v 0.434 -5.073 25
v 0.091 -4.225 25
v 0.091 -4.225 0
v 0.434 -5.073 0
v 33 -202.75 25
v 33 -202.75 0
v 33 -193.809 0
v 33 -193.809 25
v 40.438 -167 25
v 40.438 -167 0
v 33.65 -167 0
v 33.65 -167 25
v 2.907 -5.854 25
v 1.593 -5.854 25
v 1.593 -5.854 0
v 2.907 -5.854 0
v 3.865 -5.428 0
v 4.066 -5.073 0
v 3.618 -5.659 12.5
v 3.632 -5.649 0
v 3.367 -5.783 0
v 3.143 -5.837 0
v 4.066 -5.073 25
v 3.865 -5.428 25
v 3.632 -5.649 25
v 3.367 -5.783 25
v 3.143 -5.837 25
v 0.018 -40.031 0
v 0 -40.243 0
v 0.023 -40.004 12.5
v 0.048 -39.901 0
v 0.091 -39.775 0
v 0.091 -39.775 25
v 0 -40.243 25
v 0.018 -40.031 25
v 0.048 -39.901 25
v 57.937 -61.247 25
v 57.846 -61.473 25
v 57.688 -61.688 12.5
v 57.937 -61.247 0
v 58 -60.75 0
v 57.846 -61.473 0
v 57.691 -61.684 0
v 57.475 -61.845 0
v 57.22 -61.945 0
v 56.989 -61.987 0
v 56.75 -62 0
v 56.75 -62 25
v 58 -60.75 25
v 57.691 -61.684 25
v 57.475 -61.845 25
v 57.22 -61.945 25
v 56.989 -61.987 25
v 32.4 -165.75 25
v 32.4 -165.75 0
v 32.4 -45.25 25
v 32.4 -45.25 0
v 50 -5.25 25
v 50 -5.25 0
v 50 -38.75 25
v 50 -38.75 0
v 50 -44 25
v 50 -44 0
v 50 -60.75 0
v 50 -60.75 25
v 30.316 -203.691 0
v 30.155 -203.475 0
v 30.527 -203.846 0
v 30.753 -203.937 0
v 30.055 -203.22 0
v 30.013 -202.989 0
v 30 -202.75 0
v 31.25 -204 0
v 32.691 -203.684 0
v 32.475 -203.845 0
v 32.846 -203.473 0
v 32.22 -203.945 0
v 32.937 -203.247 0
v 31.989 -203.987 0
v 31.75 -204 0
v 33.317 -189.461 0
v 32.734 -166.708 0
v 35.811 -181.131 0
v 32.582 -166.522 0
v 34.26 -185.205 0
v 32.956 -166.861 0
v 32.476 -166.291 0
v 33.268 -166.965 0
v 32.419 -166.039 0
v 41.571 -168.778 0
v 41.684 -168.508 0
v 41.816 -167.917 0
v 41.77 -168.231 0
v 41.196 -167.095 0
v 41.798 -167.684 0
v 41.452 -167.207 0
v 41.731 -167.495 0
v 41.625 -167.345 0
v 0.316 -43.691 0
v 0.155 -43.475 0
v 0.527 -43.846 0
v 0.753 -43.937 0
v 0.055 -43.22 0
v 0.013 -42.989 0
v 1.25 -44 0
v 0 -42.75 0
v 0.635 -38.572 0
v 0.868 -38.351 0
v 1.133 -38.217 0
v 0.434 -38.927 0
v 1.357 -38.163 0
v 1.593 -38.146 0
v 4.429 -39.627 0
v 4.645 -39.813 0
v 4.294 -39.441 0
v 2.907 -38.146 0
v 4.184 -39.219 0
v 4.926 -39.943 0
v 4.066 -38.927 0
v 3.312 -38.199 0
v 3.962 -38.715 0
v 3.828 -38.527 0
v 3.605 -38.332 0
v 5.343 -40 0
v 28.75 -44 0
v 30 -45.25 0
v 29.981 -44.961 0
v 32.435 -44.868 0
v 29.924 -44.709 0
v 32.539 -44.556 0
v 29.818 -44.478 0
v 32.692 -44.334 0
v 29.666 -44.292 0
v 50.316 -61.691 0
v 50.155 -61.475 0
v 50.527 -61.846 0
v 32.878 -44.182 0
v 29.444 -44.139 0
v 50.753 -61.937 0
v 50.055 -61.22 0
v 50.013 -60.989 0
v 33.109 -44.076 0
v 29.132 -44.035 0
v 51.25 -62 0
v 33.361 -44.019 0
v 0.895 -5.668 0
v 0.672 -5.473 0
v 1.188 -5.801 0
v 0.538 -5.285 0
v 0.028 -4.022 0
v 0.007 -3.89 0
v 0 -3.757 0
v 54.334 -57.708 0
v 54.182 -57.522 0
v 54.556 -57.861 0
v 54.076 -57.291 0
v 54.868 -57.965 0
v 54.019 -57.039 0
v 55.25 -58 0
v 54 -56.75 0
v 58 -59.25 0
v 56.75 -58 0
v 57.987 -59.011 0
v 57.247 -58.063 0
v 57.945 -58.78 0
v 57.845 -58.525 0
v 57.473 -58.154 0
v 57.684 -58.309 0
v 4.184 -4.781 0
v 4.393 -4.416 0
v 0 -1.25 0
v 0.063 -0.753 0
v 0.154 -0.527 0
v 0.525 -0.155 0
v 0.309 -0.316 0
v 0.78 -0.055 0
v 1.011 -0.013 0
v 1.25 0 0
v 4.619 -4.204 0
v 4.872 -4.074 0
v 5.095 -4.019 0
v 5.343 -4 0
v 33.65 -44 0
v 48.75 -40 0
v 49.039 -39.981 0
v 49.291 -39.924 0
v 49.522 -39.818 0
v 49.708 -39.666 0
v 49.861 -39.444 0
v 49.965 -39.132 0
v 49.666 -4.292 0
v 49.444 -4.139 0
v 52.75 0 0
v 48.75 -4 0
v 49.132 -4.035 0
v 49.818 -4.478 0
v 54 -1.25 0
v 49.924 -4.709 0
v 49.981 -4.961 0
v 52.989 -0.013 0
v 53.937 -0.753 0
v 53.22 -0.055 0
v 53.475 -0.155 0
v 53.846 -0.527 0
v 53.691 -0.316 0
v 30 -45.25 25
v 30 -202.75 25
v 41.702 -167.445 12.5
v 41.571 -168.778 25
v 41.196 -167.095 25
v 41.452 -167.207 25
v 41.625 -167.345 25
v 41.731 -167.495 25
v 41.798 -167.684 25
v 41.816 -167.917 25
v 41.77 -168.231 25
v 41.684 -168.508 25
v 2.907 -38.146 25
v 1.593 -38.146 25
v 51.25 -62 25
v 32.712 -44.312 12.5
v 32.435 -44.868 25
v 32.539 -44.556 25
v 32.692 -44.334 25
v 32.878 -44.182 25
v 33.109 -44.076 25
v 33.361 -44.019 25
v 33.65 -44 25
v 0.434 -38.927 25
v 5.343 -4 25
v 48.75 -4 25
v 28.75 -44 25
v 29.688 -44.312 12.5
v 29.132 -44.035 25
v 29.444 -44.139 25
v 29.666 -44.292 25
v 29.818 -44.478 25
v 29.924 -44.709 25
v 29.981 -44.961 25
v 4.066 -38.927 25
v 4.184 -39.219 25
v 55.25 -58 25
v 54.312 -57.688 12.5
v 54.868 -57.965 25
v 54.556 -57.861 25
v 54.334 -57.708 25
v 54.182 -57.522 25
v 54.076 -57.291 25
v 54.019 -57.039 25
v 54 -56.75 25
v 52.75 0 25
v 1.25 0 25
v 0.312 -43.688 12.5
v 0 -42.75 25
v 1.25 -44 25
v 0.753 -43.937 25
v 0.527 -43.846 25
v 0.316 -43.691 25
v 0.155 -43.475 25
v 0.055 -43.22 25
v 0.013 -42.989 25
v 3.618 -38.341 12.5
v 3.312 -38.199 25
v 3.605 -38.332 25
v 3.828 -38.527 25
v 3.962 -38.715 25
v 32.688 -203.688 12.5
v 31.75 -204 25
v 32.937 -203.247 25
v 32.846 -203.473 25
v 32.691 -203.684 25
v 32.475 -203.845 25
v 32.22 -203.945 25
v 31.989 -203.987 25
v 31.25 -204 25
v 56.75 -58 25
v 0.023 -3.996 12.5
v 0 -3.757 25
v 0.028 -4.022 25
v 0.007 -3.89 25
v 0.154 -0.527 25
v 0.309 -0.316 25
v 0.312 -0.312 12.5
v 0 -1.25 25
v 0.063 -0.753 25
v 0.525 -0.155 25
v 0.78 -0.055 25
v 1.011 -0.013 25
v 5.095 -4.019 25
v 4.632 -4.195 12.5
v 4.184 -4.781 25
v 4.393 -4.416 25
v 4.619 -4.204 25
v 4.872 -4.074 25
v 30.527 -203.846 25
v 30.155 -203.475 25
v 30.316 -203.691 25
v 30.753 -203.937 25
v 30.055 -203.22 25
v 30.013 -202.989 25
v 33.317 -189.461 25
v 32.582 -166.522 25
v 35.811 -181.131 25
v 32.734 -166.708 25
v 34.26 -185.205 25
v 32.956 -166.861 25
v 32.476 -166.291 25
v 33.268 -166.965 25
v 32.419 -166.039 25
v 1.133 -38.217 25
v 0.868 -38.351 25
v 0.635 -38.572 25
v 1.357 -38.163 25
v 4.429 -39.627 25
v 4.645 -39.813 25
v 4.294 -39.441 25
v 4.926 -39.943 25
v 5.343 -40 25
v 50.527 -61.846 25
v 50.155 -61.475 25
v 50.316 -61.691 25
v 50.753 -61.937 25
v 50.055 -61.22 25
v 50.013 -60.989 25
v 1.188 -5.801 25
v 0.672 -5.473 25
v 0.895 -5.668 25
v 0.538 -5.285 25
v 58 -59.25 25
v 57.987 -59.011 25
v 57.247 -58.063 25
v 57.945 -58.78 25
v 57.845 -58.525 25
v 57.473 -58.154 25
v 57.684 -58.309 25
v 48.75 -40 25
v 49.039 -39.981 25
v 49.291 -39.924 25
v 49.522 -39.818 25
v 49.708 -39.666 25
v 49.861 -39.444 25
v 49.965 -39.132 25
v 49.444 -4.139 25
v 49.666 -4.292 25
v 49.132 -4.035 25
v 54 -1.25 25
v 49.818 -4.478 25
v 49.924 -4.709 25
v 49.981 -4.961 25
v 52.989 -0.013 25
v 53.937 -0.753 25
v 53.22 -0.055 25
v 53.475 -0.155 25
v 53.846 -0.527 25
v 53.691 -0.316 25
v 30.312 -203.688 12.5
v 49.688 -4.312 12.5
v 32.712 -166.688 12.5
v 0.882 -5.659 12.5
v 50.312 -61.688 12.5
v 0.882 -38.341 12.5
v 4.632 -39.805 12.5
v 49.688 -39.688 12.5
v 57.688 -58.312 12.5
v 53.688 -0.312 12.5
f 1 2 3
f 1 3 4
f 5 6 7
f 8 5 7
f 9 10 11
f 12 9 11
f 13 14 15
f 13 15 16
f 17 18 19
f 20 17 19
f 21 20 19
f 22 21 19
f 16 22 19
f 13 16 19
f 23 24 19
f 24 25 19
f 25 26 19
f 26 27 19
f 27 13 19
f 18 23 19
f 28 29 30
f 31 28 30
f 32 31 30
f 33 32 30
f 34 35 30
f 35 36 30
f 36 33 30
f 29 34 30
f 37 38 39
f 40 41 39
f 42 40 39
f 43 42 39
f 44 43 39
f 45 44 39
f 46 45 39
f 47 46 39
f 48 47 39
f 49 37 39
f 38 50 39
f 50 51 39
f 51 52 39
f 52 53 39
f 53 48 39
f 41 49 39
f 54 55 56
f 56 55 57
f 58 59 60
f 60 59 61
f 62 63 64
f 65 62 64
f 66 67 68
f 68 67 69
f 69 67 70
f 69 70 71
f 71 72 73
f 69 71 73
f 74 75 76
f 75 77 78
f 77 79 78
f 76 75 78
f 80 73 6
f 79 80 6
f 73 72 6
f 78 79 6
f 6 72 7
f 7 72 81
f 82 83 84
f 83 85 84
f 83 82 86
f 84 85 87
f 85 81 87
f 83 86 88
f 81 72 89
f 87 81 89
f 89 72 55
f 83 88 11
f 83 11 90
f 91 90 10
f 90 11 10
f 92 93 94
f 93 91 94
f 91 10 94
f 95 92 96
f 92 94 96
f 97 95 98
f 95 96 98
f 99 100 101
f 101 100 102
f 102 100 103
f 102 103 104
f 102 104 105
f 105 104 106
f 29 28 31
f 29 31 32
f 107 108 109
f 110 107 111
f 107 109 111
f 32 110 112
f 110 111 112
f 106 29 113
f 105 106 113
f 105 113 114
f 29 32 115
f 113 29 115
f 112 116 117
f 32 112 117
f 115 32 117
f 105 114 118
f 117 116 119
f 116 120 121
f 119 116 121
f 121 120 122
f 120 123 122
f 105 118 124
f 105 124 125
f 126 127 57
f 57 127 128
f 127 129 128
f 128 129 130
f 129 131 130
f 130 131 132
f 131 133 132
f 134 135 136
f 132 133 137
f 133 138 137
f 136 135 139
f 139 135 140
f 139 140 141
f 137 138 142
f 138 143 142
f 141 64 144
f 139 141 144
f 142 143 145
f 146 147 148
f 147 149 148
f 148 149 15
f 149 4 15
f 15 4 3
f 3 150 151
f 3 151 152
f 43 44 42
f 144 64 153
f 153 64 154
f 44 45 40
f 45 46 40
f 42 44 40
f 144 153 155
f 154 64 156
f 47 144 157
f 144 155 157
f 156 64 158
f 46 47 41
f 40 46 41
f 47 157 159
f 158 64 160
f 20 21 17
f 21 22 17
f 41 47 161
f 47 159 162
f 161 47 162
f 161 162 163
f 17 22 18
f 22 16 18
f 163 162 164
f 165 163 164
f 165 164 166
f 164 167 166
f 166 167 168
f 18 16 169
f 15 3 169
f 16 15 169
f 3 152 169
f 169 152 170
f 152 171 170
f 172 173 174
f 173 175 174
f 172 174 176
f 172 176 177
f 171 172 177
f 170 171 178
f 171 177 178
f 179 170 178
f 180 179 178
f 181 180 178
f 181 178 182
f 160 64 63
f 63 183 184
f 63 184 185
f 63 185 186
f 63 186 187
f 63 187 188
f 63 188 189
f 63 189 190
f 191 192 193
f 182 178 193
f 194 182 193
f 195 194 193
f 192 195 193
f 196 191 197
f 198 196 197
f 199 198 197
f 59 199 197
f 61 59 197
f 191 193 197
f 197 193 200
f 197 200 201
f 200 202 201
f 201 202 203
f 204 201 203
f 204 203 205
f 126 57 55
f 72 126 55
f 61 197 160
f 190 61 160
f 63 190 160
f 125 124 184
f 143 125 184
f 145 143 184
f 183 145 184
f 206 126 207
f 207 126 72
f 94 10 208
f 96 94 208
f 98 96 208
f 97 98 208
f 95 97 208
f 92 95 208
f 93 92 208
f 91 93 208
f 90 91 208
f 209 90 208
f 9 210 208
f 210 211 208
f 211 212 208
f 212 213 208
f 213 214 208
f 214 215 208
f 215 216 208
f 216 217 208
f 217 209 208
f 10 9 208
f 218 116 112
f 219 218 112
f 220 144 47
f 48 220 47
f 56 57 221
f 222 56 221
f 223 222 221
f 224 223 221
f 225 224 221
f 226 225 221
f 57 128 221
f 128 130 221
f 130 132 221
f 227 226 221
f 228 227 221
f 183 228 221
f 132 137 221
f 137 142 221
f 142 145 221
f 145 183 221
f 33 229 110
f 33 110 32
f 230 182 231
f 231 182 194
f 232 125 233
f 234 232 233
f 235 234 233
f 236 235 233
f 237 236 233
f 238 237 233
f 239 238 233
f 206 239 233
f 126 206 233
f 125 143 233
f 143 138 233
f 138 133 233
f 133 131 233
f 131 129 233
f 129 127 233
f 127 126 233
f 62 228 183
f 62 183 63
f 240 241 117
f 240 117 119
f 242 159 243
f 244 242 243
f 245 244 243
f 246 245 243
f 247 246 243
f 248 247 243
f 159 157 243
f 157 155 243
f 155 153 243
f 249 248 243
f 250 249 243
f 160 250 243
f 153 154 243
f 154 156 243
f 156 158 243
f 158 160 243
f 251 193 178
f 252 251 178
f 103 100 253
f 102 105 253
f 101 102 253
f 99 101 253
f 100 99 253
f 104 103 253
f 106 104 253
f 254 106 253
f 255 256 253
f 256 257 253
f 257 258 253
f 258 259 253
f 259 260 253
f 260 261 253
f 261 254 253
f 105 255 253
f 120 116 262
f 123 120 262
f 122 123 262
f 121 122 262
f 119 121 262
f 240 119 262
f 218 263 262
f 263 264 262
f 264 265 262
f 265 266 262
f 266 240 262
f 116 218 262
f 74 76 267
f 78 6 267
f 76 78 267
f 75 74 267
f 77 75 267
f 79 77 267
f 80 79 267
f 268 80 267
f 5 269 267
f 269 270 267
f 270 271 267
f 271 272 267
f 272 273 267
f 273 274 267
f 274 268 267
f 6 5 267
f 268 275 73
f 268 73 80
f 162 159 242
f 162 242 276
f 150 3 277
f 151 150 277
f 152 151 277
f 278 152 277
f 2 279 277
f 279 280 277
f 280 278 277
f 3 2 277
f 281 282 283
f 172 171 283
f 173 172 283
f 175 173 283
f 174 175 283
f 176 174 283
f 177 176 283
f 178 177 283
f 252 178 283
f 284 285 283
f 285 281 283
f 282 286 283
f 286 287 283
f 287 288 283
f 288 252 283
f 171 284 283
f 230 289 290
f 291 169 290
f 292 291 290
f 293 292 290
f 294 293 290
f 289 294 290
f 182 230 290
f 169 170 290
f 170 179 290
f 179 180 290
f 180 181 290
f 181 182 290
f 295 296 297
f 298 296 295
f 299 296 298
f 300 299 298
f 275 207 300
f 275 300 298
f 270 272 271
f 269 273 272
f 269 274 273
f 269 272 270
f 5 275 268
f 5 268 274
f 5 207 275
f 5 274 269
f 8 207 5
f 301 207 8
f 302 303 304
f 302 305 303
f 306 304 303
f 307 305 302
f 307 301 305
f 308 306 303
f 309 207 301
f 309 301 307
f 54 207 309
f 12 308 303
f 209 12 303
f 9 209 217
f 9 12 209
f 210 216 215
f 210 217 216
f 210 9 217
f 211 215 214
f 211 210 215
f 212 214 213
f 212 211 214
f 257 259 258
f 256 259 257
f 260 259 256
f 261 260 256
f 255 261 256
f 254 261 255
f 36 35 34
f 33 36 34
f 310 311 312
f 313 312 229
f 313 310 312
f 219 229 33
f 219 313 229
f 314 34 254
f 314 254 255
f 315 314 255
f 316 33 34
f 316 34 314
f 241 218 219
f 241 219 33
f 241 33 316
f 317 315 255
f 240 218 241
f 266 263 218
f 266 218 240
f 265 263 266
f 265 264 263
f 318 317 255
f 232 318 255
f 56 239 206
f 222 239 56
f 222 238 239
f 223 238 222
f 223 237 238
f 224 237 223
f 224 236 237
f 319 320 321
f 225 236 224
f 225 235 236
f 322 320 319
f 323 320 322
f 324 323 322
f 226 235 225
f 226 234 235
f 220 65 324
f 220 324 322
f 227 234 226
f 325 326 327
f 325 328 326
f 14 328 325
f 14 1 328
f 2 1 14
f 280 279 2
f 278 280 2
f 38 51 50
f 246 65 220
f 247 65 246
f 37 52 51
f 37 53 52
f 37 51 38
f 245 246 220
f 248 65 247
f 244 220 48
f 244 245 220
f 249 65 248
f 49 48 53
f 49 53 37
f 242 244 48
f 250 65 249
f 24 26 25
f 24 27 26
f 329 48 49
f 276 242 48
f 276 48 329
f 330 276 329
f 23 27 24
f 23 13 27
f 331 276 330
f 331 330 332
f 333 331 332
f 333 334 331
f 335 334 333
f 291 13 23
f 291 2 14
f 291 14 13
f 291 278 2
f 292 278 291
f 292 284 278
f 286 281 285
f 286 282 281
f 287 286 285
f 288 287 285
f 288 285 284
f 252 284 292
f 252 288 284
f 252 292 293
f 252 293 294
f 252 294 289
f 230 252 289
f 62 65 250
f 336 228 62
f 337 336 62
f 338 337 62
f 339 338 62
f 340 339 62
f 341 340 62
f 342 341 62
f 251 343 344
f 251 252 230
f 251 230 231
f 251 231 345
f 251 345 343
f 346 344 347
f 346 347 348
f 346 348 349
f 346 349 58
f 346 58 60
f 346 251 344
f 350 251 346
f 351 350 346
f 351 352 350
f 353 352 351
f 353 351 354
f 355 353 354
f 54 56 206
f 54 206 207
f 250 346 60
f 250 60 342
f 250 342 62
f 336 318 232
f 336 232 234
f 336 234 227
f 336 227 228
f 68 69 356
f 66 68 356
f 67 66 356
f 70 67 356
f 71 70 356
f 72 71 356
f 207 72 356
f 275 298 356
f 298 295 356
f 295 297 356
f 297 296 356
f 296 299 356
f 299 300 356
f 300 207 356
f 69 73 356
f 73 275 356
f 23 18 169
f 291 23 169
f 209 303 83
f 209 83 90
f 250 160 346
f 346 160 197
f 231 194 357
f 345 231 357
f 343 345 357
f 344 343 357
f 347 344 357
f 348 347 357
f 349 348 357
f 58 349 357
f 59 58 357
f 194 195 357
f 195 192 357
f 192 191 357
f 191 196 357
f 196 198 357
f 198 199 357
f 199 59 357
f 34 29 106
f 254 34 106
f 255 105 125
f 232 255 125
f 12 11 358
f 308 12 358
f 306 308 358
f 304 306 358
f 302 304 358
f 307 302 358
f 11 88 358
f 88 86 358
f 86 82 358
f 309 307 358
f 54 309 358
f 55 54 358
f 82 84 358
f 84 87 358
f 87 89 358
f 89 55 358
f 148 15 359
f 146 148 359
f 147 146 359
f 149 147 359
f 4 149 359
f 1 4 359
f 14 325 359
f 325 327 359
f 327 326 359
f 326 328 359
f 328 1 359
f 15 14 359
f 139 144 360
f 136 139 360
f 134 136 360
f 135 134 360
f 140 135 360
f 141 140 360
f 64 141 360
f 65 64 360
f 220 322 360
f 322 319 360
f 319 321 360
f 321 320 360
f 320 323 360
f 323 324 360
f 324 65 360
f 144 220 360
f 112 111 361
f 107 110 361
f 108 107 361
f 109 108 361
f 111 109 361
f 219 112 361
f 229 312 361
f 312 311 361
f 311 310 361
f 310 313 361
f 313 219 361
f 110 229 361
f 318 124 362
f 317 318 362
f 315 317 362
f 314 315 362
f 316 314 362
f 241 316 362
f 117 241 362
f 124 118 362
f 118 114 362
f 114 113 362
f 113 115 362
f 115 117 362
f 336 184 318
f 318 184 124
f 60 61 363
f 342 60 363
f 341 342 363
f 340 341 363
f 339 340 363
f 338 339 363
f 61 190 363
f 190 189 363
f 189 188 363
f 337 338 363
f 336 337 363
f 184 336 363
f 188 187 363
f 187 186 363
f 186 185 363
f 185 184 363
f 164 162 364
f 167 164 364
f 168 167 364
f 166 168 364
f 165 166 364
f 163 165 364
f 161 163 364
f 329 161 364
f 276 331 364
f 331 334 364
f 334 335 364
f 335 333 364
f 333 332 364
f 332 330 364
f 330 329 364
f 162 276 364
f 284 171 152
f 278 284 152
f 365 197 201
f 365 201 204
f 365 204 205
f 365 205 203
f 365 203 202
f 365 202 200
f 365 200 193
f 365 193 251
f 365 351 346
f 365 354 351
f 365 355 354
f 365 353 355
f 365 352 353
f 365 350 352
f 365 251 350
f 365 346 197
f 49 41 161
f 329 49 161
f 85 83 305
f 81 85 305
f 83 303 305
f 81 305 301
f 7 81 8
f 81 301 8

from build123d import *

# Parameters (mm, degrees)
F0_W        = 4
F0_H        = 4
F1_DEPTH    = 25
F2_T1_DEPTH = 25
F2_T3_DEPTH = 31.25
F2_T5_DEPTH = 29.2137491404
F2_T7_DEPTH = 26.2162531519
F2_T9_DEPTH = 34.810534857
F3_R        = 30


# Not quite as in the source:
# - a fillet or chamfer that OpenCascade refuses, or shapes differently, is made with other operations: its cross-section is extruded or revolved along the edge and cut away or added


with BuildPart() as f1:
    # F0 (on Top) → F1 (new body)
    with BuildSketch(Plane.XY):
        Polygon((54, 0), (0, 0), (0, -4), (4.5, -4), (50, -4), (50, -40), (4.5, -40), (0, -40), (0, -44), (30, -44), (30, -204), (33, -204), (33, -187.1583650528), (42.4, -167), (32.4, -167), (32.4, -44), (50, -44), (50, -62), (54, -62), (54, -58), align=None)
        Polygon((4.5, -4), (0, -4), (0.75, -5.8540496218), (3.75, -5.8540496218), align=None)
        with Locations((56, -60)):
            Rectangle(F0_W, F0_H)
        Polygon((0, -40), (4.5, -40), (3.75, -38.1459503782), (0.75, -38.1459503782), align=None)
    extrude(amount=F1_DEPTH)

    # F2: fillet of radius 1.25 on 23 edges, made by hand

    # F2_s2 → F2_t1 (join)
    with BuildSketch(Plane.XY):
        with BuildLine():
            add(Edge.make_bspline(
                [(4.1839688145, -4.78125), (4.5, -4), (5.3427498281, -4)],
                knots=[0, 0, 0, 1, 1, 1], degree=2, weights=[1, 1, 1]))
            Line((5.3427498281, -4), (4.5, -4))
            Line((4.5, -4), (4.1839688145, -4.78125))
        make_face()
        with BuildLine():
            add(Edge.make_bspline(
                [(5.3427498281, -40), (4.5, -40), (4.1839688145, -39.21875)],
                knots=[0, 0, 0, 1, 1, 1], degree=2, weights=[1, 1, 1]))
            Line((4.1839688145, -39.21875), (4.5, -40))
            Line((4.5, -40), (5.3427498281, -40))
        make_face()
        with BuildLine():
            add(Edge.make_bspline(
                [(50, -38.75), (50, -40), (48.75, -40)],
                knots=[0, 0, 0, 1, 1, 1], degree=2, weights=[1, 1, 1]))
            Line((48.75, -40), (50, -40))
            Line((50, -40), (50, -38.75))
        make_face()
        with BuildLine():
            add(Edge.make_bspline(
                [(48.75, -4), (50, -4), (50, -5.25)],
                knots=[0, 0, 0, 1, 1, 1], degree=2, weights=[1, 1, 1]))
            Line((50, -5.25), (50, -4))
            Line((50, -4), (48.75, -4))
        make_face()
        with BuildLine():
            add(Edge.make_bspline(
                [(55.25, -58), (54, -58), (54, -56.75)],
                knots=[0, 0, 0, 1, 1, 1], degree=2, weights=[1, 1, 1]))
            Line((54, -56.75), (54, -58))
            Line((54, -58), (55.25, -58))
        make_face()
        with BuildLine():
            add(Edge.make_bspline(
                [(28.75, -44), (30, -44), (30, -45.25)],
                knots=[0, 0, 0, 1, 1, 1], degree=2, weights=[1, 1, 1]))
            Line((30, -45.25), (30, -44))
            Line((30, -44), (28.75, -44))
        make_face()
        with BuildLine():
            add(Edge.make_bspline(
                [(32.4, -45.25), (32.4, -44), (33.65, -44)],
                knots=[0, 0, 0, 1, 1, 1], degree=2, weights=[1, 1, 1]))
            Line((33.65, -44), (32.4, -44))
            Line((32.4, -44), (32.4, -45.25))
        make_face()
        with BuildLine():
            add(Edge.make_bspline(
                [(33.65, -167), (32.4, -167), (32.4, -165.75)],
                knots=[0, 0, 0, 1, 1, 1], degree=2, weights=[1, 1, 1]))
            Line((32.4, -165.75), (32.4, -167))
            Line((32.4, -167), (33.65, -167))
        make_face()
    extrude(amount=F2_T1_DEPTH)

    # F2_s4 → F2_t3 (cut)
    with BuildSketch(Plane.XY.offset(-3.125)):
        with BuildLine():
            add(Edge.make_bspline(
                [(31.75, -204), (33, -204), (33, -202.75)],
                knots=[0, 0, 0, 1, 1, 1], degree=2, weights=[1, 1, 1]))
            Line((33, -202.75), (33, -204))
            Line((33, -204), (31.75, -204))
        make_face()
        with BuildLine():
            add(Edge.make_bspline(
                [(30, -202.75), (30, -204), (31.25, -204)],
                knots=[0, 0, 0, 1, 1, 1], degree=2, weights=[1, 1, 1]))
            Line((31.25, -204), (30, -204))
            Line((30, -204), (30, -202.75))
        make_face()
        with BuildLine():
            add(Edge.make_bspline(
                [(1.25, 0), (0, 0), (0, -1.25)],
                knots=[0, 0, 0, 1, 1, 1], degree=2, weights=[1, 1, 1]))
            Line((0, -1.25), (0, 0))
            Line((0, 0), (1.25, 0))
        make_face()
        with BuildLine():
            add(Edge.make_bspline(
                [(0, -42.75), (0, -44), (1.25, -44)],
                knots=[0, 0, 0, 1, 1, 1], degree=2, weights=[1, 1, 1]))
            Line((1.25, -44), (0, -44))
            Line((0, -44), (0, -42.75))
        make_face()
        with BuildLine():
            add(Edge.make_bspline(
                [(52.75, 0), (54, 0), (54, -1.25)],
                knots=[0, 0, 0, 1, 1, 1], degree=2, weights=[1, 1, 1]))
            Line((54, -1.25), (54, 0))
            Line((54, 0), (52.75, 0))
        make_face()
        with BuildLine():
            add(Edge.make_bspline(
                [(58, -59.25), (58, -58), (56.75, -58)],
                knots=[0, 0, 0, 1, 1, 1], degree=2, weights=[1, 1, 1]))
            Line((56.75, -58), (58, -58))
            Line((58, -58), (58, -59.25))
        make_face()
        with BuildLine():
            add(Edge.make_bspline(
                [(56.75, -62), (58, -62), (58, -60.75)],
                knots=[0, 0, 0, 1, 1, 1], degree=2, weights=[1, 1, 1]))
            Line((58, -60.75), (58, -62))
            Line((58, -62), (56.75, -62))
        make_face()
        with BuildLine():
            add(Edge.make_bspline(
                [(50, -60.75), (50, -62), (51.25, -62)],
                knots=[0, 0, 0, 1, 1, 1], degree=2, weights=[1, 1, 1]))
            Line((51.25, -62), (50, -62))
            Line((50, -62), (50, -60.75))
        make_face()
    extrude(amount=F2_T3_DEPTH, mode=Mode.SUBTRACT)

    # F2_s6 → F2_t5 (cut)
    with BuildSketch(Plane.XY.offset(-2.1068745702)):
        with BuildLine():
            add(Edge.make_bspline(
                [(2.9072501719, -5.8540496218), (3.75, -5.8540496218), (4.0660311855, -5.0727996218)],
                knots=[0, 0, 0, 1, 1, 1], degree=2, weights=[1, 1, 1]))
            Line((4.0660311855, -5.0727996218), (3.75, -5.8540496218))
            Line((3.75, -5.8540496218), (2.9072501719, -5.8540496218))
        make_face()
        with BuildLine():
            add(Edge.make_bspline(
                [(0.4339688145, -5.0727996218), (0.75, -5.8540496218), (1.5927498281, -5.8540496218)],
                knots=[0, 0, 0, 1, 1, 1], degree=2, weights=[1, 1, 1]))
            Line((1.5927498281, -5.8540496218), (0.75, -5.8540496218))
            Line((0.75, -5.8540496218), (0.4339688145, -5.0727996218))
        make_face()
        with BuildLine():
            add(Edge.make_bspline(
                [(1.5927498281, -38.1459503782), (0.75, -38.1459503782), (0.4339688145, -38.9272003782)],
                knots=[0, 0, 0, 1, 1, 1], degree=2, weights=[1, 1, 1]))
            Line((0.4339688145, -38.9272003782), (0.75, -38.1459503782))
            Line((0.75, -38.1459503782), (1.5927498281, -38.1459503782))
        make_face()
        with BuildLine():
            add(Edge.make_bspline(
                [(4.0660311855, -38.9272003782), (3.75, -38.1459503782), (2.9072501719, -38.1459503782)],
                knots=[0, 0, 0, 1, 1, 1], degree=2, weights=[1, 1, 1]))
            Line((2.9072501719, -38.1459503782), (3.75, -38.1459503782))
            Line((3.75, -38.1459503782), (4.0660311855, -38.9272003782))
        make_face()
    extrude(amount=F2_T5_DEPTH, mode=Mode.SUBTRACT)

    # F2_s8 → F2_t7 (cut)
    with BuildSketch(Plane.XY.offset(-0.6081265759)):
        with BuildLine():
            add(Edge.make_bspline(
                [(0, -3.7567493696), (0, -4), (0.0912189864, -4.2254993696)],
                knots=[0, 0, 0, 1, 1, 1], degree=2, weights=[1, 1, 1]))
            Line((0.0912189864, -4.2254993696), (0, -4))
            Line((0, -4), (0, -3.7567493696))
        make_face()
        with BuildLine():
            add(Edge.make_bspline(
                [(0.0912189864, -39.7745006304), (0, -40), (0, -40.2432506304)],
                knots=[0, 0, 0, 1, 1, 1], degree=2, weights=[1, 1, 1]))
            Line((0, -40.2432506304), (0, -40))
            Line((0, -40), (0.0912189864, -39.7745006304))
        make_face()
    extrude(amount=F2_T7_DEPTH, mode=Mode.SUBTRACT)

    # F2_s10 → F2_t9 (cut)
    with BuildSketch(Plane.XY.offset(-4.9052674285)):
        with BuildLine():
            add(Edge.make_bspline(
                [(41.5707777624, -168.7782728272), (42.4, -167), (40.4378930286, -167)],
                knots=[0, 0, 0, 1, 1, 1], degree=2, weights=[1, 1, 1]))
            Line((40.4378930286, -167), (42.4, -167))
            Line((42.4, -167), (41.5707777624, -168.7782728272))
        make_face()
    extrude(amount=F2_T9_DEPTH, mode=Mode.SUBTRACT)

    # F3
    f3_edges = [f1.edges().sort_by_distance(p)[0] for p in [
        (33, -187.158365, 12.5),
    ]]
    fillet(f3_edges, radius=F3_R)


solid = f1.part
